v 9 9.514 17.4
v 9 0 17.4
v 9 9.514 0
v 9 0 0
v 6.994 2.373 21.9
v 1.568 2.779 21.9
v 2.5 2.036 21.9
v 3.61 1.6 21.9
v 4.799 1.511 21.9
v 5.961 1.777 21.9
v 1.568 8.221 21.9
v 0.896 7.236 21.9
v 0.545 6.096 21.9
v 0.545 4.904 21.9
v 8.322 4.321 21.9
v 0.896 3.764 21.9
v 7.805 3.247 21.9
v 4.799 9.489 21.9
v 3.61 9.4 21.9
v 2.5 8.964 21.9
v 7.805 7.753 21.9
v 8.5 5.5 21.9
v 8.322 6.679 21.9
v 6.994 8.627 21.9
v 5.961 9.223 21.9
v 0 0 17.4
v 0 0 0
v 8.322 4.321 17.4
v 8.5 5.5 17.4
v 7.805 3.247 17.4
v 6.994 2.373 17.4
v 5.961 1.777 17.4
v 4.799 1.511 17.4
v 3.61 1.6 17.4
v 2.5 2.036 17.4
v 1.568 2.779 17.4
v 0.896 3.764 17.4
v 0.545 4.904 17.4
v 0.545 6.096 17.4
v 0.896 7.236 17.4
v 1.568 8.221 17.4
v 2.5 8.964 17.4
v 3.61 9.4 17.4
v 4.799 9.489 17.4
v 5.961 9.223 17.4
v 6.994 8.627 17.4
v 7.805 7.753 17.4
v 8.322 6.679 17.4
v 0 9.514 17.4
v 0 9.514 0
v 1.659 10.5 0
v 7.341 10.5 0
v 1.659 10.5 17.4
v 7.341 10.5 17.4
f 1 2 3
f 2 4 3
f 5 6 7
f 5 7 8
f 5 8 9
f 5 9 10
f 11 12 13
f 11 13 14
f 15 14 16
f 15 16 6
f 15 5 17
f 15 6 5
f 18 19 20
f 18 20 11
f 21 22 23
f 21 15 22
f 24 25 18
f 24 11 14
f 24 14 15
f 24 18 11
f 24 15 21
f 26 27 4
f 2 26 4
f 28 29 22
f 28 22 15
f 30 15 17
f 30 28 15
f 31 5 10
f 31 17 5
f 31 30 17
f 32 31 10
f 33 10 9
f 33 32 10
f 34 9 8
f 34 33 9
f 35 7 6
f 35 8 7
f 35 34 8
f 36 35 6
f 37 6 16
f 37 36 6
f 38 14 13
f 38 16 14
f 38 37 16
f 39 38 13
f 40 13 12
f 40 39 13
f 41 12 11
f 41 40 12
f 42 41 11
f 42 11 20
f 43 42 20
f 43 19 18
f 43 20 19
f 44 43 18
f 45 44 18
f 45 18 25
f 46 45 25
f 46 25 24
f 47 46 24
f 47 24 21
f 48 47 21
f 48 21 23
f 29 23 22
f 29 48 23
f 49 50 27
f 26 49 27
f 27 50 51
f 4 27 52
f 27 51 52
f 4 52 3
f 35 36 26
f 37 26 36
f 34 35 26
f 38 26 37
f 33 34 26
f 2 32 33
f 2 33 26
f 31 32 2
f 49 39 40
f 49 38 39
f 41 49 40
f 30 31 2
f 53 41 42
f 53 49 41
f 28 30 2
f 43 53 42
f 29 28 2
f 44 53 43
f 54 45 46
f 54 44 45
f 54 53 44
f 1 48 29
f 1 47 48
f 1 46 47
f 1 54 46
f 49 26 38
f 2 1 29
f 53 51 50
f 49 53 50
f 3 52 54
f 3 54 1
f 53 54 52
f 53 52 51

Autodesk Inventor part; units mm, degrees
ref_plane "YZ Plane" through (0, 0, 0) normal (1, 0, 0) x (0, 1, 0)
ref_plane "XZ Plane" through (0, 0, 0) normal (0, 1, 0) x (-1, 0, 0)
ref_plane "XY Plane" through (0, 0, 0) normal (0, 0, 1) x (1, 0, 0)
sketch "Sketch1" plane through (0, 0, 0) normal (0, 0, 1) x (1, 0, 0)
  line L0 (0, 0) -> (9, 0)
  line L1 (9, 0) -> (9, 10.5)
  line L2 (9, 10.5) -> (0, 10.5)
  line L3 (0, 10.5) -> (0, 0)
  dimension "d0" = 9
  dimension "d1" = 10.5
extrude "Extrusion1" add sketch "Sketch1" along normal blind 17.4
sketch "Sketch2" plane through (0, 0, 17.4) normal (0, 0, 1) x (1, 0, 0)
  line L0 (9, 10.5) -> (0, 10.5) construction
  line L1 (4.5, 10.5) -> (4.5, 0) construction
  circle A0 centre (4.5, 5.5) radius 4
  point P0 (0, 0)
  dimension "d4" = 8
  dimension "d5" = 5
extrude "Extrusion2" add sketch "Sketch2" along normal blind 4.5
sketch "Sketch3" plane through (0, 0, 17.4) normal (0, 0, 1) x (1, 0, 0)
  line L0 (9, 10.5) -> (0, 10.5) construction
  line L1 (4.5, 10.5) -> (4.5, 0) construction
  line L2 (0, 0) -> (9, 0) construction
  line L3 (1.6586, 10.5) -> (0, 9.5141)
  line L4 (0, 10.5) -> (0, 0) projected
  line L5 (0, 9.5141) -> (0, 10.5)
  line L6 (0, 10.5) -> (1.6586, 10.5)
  line L7 (7.3414, 10.5) -> (9, 9.5141)
  line L8 (9, 9.5141) -> (9, 10.5)
  line L9 (9, 10.5) -> (7.3414, 10.5)
extrude "Extrusion3" cut sketch "Sketch3" against normal through all
properties part number "jack"
